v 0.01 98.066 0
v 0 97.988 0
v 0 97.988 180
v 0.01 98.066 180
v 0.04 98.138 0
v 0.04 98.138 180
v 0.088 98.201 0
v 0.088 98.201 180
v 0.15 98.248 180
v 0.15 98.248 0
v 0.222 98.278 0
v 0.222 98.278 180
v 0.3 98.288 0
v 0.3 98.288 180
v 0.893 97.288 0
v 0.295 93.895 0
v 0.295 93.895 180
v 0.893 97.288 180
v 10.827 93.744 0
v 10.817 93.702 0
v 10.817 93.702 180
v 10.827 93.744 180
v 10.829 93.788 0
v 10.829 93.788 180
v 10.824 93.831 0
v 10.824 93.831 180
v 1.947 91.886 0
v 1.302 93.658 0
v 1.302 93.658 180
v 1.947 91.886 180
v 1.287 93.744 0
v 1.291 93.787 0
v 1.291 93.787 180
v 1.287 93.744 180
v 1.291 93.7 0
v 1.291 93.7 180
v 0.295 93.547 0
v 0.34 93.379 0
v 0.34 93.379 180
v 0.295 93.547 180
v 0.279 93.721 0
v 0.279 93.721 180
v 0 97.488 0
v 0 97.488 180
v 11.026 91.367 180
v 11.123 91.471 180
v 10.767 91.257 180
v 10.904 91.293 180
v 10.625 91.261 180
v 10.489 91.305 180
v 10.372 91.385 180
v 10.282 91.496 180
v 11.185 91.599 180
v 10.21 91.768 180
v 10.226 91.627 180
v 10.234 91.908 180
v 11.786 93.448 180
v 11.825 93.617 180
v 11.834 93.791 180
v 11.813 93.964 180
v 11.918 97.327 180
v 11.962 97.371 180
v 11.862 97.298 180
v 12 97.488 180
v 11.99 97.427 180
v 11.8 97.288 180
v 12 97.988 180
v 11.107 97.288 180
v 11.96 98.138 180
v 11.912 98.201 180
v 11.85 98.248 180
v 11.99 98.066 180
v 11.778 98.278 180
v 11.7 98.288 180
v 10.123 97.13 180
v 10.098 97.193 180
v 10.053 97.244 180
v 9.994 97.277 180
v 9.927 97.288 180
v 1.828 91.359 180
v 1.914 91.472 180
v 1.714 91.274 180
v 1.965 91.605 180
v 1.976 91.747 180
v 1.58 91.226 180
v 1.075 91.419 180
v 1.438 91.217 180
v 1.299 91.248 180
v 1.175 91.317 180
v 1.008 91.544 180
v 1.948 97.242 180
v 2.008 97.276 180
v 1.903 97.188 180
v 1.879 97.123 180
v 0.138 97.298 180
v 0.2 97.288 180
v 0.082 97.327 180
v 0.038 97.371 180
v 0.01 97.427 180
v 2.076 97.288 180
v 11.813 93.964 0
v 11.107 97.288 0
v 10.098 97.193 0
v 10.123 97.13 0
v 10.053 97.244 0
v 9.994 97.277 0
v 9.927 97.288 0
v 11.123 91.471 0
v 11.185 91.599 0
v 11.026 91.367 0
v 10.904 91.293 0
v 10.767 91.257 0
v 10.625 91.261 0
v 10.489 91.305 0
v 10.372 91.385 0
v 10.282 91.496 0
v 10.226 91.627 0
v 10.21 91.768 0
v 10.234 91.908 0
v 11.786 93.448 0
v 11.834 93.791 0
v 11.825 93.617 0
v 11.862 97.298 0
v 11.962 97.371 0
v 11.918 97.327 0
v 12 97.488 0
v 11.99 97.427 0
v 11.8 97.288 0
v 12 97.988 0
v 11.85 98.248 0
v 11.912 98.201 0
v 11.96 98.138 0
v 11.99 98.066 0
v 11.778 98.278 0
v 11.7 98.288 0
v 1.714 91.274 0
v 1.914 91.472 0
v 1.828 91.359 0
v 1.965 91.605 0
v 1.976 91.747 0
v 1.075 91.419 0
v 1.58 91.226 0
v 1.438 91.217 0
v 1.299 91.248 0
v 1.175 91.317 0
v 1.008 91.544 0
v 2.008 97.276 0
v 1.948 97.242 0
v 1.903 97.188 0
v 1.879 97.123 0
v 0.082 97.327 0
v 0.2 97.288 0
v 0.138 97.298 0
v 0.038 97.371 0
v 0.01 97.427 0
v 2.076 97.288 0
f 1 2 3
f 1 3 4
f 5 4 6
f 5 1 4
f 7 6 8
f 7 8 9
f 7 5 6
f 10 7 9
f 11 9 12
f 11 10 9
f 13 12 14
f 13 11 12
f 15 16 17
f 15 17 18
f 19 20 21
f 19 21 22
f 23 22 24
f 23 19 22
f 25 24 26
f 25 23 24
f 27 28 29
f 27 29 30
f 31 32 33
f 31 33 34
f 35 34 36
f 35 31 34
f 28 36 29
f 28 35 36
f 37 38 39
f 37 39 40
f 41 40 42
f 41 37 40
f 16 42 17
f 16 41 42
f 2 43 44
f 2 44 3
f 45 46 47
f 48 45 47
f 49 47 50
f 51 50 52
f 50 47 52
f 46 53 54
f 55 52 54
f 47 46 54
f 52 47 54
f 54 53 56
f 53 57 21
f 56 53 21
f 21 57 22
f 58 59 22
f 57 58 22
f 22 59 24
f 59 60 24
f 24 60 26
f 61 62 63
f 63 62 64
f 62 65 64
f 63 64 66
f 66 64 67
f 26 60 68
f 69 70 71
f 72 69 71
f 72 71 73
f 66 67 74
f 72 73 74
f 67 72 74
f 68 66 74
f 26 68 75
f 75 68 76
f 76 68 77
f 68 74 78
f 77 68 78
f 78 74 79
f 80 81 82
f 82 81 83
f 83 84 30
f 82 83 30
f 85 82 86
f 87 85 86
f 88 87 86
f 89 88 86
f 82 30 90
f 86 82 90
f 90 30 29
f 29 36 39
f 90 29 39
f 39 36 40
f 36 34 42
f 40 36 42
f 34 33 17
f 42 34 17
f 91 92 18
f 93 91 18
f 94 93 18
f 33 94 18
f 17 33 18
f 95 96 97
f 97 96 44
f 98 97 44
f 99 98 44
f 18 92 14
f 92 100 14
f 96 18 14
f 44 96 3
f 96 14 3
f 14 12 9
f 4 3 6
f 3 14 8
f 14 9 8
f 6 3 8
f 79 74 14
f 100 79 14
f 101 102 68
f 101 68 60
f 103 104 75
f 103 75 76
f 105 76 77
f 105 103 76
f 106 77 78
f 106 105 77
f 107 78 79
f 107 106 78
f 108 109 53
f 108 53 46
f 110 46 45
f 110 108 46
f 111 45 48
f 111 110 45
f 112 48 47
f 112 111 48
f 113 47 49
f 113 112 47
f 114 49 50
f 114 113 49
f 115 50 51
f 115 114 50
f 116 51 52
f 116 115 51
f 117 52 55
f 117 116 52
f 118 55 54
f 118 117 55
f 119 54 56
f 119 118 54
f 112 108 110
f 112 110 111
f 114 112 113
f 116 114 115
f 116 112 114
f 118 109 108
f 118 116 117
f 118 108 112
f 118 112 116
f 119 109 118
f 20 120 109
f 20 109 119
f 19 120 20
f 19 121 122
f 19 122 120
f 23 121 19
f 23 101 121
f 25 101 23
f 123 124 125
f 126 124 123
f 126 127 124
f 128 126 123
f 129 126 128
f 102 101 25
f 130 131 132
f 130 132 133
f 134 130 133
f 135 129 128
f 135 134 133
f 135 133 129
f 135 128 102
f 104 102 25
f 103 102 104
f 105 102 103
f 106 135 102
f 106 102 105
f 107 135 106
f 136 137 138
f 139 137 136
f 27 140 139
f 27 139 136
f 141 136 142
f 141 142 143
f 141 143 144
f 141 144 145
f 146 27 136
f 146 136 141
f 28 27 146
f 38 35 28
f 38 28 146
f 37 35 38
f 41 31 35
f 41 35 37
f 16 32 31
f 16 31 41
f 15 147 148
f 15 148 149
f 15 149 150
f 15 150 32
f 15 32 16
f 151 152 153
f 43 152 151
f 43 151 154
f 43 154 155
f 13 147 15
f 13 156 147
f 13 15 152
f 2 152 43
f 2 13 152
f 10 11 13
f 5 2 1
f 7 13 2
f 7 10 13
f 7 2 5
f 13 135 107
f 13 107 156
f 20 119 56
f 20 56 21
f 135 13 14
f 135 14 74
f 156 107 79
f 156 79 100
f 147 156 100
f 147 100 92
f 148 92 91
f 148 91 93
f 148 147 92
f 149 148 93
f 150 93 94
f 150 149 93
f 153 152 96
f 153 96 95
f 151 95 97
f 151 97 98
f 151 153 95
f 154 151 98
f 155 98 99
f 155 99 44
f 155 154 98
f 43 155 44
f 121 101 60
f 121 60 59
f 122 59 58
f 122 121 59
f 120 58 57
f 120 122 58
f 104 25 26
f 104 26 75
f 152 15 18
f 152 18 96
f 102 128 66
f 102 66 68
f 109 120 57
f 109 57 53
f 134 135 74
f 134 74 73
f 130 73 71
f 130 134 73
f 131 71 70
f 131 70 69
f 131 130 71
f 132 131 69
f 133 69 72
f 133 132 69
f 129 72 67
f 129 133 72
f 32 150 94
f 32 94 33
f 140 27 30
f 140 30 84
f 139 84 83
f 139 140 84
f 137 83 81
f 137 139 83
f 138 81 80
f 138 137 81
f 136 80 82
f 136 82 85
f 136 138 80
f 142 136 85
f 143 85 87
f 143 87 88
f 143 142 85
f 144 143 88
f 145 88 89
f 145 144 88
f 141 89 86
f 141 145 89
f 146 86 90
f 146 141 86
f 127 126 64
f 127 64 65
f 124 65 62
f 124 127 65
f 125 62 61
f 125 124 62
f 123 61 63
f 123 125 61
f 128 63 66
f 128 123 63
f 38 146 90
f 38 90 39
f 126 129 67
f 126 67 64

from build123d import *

# Parameters (mm, degrees)
EXTRUDE_1_DEPTH = 180


with BuildPart() as part:
    # 草图1 → 拉伸1 (new body)
    with BuildSketch(Plane.XY):
        with BuildLine():
            Line((11.786098163, 93.447548514), (11.185365906, 91.59914157))
            ThreePointArc((11.185365906, 91.59914157), (10.555305835, 91.278167571), (10.234331837, 91.908227642))
            Line((10.234331837, 91.908227642), (10.817155535, 93.701531326))
            ThreePointArc((10.817155535, 93.701531326), (10.82905345, 93.765700722), (10.823937692, 93.830763005))
            Line((10.823937692, 93.830763005), (10.12292529, 97.129945359))
            ThreePointArc((10.12292529, 97.129945359), (10.053162473, 97.243801851), (9.92729275, 97.28837723))
            Line((9.92729275, 97.28837723), (2.076289972, 97.28837723))
            ThreePointArc((2.076289972, 97.28837723), (1.94773245, 97.241586118), (1.879328421, 97.123106865))
            Line((1.879328421, 97.123106865), (1.291080466, 93.786986931))
            ThreePointArc((1.291080466, 93.786986931), (1.28823373, 93.721785951), (1.302359249, 93.658069851))
            Line((1.302359249, 93.658069851), (1.947284603, 91.886152004))
            ThreePointArc((1.947284603, 91.886152004), (1.648448364, 91.245295622), (1.007591982, 91.544131861))
            Line((1.007591982, 91.544131861), (0.339755623, 93.378997177))
            ThreePointArc((0.339755623, 93.378997177), (0.283253546, 93.633861578), (0.294640491, 93.894665498))
            Line((0.294640491, 93.894665498), (0.893043434, 97.28837723))
            Line((0.893043434, 97.28837723), (0.200002689, 97.28837723))
            ThreePointArc((0.200002689, 97.28837723), (0.058581333, 97.346955874), (2.689e-06, 97.48837723))
            Line((2.689e-06, 97.48837723), (2.689e-06, 97.98837723))
            ThreePointArc((2.689e-06, 97.98837723), (0.087870655, 98.200509264), (0.300002689, 98.28837723))
            Line((0.300002689, 98.28837723), (11.700002689, 98.28837723))
            ThreePointArc((11.700002689, 98.28837723), (11.912134724, 98.200509264), (12.000002689, 97.98837723))
            Line((12.000002689, 97.98837723), (12.000002689, 97.48837723))
            ThreePointArc((12.000002689, 97.48837723), (11.941424046, 97.346955874), (11.800002689, 97.28837723))
            Line((11.800002689, 97.28837723), (11.106961944, 97.28837723))
            Line((11.106961944, 97.28837723), (11.813226794, 93.96447523))
            ThreePointArc((11.813226794, 93.96447523), (11.833689825, 93.704226096), (11.786098163, 93.447548514))
        make_face()
    extrude(amount=EXTRUDE_1_DEPTH)


solid = part.part
